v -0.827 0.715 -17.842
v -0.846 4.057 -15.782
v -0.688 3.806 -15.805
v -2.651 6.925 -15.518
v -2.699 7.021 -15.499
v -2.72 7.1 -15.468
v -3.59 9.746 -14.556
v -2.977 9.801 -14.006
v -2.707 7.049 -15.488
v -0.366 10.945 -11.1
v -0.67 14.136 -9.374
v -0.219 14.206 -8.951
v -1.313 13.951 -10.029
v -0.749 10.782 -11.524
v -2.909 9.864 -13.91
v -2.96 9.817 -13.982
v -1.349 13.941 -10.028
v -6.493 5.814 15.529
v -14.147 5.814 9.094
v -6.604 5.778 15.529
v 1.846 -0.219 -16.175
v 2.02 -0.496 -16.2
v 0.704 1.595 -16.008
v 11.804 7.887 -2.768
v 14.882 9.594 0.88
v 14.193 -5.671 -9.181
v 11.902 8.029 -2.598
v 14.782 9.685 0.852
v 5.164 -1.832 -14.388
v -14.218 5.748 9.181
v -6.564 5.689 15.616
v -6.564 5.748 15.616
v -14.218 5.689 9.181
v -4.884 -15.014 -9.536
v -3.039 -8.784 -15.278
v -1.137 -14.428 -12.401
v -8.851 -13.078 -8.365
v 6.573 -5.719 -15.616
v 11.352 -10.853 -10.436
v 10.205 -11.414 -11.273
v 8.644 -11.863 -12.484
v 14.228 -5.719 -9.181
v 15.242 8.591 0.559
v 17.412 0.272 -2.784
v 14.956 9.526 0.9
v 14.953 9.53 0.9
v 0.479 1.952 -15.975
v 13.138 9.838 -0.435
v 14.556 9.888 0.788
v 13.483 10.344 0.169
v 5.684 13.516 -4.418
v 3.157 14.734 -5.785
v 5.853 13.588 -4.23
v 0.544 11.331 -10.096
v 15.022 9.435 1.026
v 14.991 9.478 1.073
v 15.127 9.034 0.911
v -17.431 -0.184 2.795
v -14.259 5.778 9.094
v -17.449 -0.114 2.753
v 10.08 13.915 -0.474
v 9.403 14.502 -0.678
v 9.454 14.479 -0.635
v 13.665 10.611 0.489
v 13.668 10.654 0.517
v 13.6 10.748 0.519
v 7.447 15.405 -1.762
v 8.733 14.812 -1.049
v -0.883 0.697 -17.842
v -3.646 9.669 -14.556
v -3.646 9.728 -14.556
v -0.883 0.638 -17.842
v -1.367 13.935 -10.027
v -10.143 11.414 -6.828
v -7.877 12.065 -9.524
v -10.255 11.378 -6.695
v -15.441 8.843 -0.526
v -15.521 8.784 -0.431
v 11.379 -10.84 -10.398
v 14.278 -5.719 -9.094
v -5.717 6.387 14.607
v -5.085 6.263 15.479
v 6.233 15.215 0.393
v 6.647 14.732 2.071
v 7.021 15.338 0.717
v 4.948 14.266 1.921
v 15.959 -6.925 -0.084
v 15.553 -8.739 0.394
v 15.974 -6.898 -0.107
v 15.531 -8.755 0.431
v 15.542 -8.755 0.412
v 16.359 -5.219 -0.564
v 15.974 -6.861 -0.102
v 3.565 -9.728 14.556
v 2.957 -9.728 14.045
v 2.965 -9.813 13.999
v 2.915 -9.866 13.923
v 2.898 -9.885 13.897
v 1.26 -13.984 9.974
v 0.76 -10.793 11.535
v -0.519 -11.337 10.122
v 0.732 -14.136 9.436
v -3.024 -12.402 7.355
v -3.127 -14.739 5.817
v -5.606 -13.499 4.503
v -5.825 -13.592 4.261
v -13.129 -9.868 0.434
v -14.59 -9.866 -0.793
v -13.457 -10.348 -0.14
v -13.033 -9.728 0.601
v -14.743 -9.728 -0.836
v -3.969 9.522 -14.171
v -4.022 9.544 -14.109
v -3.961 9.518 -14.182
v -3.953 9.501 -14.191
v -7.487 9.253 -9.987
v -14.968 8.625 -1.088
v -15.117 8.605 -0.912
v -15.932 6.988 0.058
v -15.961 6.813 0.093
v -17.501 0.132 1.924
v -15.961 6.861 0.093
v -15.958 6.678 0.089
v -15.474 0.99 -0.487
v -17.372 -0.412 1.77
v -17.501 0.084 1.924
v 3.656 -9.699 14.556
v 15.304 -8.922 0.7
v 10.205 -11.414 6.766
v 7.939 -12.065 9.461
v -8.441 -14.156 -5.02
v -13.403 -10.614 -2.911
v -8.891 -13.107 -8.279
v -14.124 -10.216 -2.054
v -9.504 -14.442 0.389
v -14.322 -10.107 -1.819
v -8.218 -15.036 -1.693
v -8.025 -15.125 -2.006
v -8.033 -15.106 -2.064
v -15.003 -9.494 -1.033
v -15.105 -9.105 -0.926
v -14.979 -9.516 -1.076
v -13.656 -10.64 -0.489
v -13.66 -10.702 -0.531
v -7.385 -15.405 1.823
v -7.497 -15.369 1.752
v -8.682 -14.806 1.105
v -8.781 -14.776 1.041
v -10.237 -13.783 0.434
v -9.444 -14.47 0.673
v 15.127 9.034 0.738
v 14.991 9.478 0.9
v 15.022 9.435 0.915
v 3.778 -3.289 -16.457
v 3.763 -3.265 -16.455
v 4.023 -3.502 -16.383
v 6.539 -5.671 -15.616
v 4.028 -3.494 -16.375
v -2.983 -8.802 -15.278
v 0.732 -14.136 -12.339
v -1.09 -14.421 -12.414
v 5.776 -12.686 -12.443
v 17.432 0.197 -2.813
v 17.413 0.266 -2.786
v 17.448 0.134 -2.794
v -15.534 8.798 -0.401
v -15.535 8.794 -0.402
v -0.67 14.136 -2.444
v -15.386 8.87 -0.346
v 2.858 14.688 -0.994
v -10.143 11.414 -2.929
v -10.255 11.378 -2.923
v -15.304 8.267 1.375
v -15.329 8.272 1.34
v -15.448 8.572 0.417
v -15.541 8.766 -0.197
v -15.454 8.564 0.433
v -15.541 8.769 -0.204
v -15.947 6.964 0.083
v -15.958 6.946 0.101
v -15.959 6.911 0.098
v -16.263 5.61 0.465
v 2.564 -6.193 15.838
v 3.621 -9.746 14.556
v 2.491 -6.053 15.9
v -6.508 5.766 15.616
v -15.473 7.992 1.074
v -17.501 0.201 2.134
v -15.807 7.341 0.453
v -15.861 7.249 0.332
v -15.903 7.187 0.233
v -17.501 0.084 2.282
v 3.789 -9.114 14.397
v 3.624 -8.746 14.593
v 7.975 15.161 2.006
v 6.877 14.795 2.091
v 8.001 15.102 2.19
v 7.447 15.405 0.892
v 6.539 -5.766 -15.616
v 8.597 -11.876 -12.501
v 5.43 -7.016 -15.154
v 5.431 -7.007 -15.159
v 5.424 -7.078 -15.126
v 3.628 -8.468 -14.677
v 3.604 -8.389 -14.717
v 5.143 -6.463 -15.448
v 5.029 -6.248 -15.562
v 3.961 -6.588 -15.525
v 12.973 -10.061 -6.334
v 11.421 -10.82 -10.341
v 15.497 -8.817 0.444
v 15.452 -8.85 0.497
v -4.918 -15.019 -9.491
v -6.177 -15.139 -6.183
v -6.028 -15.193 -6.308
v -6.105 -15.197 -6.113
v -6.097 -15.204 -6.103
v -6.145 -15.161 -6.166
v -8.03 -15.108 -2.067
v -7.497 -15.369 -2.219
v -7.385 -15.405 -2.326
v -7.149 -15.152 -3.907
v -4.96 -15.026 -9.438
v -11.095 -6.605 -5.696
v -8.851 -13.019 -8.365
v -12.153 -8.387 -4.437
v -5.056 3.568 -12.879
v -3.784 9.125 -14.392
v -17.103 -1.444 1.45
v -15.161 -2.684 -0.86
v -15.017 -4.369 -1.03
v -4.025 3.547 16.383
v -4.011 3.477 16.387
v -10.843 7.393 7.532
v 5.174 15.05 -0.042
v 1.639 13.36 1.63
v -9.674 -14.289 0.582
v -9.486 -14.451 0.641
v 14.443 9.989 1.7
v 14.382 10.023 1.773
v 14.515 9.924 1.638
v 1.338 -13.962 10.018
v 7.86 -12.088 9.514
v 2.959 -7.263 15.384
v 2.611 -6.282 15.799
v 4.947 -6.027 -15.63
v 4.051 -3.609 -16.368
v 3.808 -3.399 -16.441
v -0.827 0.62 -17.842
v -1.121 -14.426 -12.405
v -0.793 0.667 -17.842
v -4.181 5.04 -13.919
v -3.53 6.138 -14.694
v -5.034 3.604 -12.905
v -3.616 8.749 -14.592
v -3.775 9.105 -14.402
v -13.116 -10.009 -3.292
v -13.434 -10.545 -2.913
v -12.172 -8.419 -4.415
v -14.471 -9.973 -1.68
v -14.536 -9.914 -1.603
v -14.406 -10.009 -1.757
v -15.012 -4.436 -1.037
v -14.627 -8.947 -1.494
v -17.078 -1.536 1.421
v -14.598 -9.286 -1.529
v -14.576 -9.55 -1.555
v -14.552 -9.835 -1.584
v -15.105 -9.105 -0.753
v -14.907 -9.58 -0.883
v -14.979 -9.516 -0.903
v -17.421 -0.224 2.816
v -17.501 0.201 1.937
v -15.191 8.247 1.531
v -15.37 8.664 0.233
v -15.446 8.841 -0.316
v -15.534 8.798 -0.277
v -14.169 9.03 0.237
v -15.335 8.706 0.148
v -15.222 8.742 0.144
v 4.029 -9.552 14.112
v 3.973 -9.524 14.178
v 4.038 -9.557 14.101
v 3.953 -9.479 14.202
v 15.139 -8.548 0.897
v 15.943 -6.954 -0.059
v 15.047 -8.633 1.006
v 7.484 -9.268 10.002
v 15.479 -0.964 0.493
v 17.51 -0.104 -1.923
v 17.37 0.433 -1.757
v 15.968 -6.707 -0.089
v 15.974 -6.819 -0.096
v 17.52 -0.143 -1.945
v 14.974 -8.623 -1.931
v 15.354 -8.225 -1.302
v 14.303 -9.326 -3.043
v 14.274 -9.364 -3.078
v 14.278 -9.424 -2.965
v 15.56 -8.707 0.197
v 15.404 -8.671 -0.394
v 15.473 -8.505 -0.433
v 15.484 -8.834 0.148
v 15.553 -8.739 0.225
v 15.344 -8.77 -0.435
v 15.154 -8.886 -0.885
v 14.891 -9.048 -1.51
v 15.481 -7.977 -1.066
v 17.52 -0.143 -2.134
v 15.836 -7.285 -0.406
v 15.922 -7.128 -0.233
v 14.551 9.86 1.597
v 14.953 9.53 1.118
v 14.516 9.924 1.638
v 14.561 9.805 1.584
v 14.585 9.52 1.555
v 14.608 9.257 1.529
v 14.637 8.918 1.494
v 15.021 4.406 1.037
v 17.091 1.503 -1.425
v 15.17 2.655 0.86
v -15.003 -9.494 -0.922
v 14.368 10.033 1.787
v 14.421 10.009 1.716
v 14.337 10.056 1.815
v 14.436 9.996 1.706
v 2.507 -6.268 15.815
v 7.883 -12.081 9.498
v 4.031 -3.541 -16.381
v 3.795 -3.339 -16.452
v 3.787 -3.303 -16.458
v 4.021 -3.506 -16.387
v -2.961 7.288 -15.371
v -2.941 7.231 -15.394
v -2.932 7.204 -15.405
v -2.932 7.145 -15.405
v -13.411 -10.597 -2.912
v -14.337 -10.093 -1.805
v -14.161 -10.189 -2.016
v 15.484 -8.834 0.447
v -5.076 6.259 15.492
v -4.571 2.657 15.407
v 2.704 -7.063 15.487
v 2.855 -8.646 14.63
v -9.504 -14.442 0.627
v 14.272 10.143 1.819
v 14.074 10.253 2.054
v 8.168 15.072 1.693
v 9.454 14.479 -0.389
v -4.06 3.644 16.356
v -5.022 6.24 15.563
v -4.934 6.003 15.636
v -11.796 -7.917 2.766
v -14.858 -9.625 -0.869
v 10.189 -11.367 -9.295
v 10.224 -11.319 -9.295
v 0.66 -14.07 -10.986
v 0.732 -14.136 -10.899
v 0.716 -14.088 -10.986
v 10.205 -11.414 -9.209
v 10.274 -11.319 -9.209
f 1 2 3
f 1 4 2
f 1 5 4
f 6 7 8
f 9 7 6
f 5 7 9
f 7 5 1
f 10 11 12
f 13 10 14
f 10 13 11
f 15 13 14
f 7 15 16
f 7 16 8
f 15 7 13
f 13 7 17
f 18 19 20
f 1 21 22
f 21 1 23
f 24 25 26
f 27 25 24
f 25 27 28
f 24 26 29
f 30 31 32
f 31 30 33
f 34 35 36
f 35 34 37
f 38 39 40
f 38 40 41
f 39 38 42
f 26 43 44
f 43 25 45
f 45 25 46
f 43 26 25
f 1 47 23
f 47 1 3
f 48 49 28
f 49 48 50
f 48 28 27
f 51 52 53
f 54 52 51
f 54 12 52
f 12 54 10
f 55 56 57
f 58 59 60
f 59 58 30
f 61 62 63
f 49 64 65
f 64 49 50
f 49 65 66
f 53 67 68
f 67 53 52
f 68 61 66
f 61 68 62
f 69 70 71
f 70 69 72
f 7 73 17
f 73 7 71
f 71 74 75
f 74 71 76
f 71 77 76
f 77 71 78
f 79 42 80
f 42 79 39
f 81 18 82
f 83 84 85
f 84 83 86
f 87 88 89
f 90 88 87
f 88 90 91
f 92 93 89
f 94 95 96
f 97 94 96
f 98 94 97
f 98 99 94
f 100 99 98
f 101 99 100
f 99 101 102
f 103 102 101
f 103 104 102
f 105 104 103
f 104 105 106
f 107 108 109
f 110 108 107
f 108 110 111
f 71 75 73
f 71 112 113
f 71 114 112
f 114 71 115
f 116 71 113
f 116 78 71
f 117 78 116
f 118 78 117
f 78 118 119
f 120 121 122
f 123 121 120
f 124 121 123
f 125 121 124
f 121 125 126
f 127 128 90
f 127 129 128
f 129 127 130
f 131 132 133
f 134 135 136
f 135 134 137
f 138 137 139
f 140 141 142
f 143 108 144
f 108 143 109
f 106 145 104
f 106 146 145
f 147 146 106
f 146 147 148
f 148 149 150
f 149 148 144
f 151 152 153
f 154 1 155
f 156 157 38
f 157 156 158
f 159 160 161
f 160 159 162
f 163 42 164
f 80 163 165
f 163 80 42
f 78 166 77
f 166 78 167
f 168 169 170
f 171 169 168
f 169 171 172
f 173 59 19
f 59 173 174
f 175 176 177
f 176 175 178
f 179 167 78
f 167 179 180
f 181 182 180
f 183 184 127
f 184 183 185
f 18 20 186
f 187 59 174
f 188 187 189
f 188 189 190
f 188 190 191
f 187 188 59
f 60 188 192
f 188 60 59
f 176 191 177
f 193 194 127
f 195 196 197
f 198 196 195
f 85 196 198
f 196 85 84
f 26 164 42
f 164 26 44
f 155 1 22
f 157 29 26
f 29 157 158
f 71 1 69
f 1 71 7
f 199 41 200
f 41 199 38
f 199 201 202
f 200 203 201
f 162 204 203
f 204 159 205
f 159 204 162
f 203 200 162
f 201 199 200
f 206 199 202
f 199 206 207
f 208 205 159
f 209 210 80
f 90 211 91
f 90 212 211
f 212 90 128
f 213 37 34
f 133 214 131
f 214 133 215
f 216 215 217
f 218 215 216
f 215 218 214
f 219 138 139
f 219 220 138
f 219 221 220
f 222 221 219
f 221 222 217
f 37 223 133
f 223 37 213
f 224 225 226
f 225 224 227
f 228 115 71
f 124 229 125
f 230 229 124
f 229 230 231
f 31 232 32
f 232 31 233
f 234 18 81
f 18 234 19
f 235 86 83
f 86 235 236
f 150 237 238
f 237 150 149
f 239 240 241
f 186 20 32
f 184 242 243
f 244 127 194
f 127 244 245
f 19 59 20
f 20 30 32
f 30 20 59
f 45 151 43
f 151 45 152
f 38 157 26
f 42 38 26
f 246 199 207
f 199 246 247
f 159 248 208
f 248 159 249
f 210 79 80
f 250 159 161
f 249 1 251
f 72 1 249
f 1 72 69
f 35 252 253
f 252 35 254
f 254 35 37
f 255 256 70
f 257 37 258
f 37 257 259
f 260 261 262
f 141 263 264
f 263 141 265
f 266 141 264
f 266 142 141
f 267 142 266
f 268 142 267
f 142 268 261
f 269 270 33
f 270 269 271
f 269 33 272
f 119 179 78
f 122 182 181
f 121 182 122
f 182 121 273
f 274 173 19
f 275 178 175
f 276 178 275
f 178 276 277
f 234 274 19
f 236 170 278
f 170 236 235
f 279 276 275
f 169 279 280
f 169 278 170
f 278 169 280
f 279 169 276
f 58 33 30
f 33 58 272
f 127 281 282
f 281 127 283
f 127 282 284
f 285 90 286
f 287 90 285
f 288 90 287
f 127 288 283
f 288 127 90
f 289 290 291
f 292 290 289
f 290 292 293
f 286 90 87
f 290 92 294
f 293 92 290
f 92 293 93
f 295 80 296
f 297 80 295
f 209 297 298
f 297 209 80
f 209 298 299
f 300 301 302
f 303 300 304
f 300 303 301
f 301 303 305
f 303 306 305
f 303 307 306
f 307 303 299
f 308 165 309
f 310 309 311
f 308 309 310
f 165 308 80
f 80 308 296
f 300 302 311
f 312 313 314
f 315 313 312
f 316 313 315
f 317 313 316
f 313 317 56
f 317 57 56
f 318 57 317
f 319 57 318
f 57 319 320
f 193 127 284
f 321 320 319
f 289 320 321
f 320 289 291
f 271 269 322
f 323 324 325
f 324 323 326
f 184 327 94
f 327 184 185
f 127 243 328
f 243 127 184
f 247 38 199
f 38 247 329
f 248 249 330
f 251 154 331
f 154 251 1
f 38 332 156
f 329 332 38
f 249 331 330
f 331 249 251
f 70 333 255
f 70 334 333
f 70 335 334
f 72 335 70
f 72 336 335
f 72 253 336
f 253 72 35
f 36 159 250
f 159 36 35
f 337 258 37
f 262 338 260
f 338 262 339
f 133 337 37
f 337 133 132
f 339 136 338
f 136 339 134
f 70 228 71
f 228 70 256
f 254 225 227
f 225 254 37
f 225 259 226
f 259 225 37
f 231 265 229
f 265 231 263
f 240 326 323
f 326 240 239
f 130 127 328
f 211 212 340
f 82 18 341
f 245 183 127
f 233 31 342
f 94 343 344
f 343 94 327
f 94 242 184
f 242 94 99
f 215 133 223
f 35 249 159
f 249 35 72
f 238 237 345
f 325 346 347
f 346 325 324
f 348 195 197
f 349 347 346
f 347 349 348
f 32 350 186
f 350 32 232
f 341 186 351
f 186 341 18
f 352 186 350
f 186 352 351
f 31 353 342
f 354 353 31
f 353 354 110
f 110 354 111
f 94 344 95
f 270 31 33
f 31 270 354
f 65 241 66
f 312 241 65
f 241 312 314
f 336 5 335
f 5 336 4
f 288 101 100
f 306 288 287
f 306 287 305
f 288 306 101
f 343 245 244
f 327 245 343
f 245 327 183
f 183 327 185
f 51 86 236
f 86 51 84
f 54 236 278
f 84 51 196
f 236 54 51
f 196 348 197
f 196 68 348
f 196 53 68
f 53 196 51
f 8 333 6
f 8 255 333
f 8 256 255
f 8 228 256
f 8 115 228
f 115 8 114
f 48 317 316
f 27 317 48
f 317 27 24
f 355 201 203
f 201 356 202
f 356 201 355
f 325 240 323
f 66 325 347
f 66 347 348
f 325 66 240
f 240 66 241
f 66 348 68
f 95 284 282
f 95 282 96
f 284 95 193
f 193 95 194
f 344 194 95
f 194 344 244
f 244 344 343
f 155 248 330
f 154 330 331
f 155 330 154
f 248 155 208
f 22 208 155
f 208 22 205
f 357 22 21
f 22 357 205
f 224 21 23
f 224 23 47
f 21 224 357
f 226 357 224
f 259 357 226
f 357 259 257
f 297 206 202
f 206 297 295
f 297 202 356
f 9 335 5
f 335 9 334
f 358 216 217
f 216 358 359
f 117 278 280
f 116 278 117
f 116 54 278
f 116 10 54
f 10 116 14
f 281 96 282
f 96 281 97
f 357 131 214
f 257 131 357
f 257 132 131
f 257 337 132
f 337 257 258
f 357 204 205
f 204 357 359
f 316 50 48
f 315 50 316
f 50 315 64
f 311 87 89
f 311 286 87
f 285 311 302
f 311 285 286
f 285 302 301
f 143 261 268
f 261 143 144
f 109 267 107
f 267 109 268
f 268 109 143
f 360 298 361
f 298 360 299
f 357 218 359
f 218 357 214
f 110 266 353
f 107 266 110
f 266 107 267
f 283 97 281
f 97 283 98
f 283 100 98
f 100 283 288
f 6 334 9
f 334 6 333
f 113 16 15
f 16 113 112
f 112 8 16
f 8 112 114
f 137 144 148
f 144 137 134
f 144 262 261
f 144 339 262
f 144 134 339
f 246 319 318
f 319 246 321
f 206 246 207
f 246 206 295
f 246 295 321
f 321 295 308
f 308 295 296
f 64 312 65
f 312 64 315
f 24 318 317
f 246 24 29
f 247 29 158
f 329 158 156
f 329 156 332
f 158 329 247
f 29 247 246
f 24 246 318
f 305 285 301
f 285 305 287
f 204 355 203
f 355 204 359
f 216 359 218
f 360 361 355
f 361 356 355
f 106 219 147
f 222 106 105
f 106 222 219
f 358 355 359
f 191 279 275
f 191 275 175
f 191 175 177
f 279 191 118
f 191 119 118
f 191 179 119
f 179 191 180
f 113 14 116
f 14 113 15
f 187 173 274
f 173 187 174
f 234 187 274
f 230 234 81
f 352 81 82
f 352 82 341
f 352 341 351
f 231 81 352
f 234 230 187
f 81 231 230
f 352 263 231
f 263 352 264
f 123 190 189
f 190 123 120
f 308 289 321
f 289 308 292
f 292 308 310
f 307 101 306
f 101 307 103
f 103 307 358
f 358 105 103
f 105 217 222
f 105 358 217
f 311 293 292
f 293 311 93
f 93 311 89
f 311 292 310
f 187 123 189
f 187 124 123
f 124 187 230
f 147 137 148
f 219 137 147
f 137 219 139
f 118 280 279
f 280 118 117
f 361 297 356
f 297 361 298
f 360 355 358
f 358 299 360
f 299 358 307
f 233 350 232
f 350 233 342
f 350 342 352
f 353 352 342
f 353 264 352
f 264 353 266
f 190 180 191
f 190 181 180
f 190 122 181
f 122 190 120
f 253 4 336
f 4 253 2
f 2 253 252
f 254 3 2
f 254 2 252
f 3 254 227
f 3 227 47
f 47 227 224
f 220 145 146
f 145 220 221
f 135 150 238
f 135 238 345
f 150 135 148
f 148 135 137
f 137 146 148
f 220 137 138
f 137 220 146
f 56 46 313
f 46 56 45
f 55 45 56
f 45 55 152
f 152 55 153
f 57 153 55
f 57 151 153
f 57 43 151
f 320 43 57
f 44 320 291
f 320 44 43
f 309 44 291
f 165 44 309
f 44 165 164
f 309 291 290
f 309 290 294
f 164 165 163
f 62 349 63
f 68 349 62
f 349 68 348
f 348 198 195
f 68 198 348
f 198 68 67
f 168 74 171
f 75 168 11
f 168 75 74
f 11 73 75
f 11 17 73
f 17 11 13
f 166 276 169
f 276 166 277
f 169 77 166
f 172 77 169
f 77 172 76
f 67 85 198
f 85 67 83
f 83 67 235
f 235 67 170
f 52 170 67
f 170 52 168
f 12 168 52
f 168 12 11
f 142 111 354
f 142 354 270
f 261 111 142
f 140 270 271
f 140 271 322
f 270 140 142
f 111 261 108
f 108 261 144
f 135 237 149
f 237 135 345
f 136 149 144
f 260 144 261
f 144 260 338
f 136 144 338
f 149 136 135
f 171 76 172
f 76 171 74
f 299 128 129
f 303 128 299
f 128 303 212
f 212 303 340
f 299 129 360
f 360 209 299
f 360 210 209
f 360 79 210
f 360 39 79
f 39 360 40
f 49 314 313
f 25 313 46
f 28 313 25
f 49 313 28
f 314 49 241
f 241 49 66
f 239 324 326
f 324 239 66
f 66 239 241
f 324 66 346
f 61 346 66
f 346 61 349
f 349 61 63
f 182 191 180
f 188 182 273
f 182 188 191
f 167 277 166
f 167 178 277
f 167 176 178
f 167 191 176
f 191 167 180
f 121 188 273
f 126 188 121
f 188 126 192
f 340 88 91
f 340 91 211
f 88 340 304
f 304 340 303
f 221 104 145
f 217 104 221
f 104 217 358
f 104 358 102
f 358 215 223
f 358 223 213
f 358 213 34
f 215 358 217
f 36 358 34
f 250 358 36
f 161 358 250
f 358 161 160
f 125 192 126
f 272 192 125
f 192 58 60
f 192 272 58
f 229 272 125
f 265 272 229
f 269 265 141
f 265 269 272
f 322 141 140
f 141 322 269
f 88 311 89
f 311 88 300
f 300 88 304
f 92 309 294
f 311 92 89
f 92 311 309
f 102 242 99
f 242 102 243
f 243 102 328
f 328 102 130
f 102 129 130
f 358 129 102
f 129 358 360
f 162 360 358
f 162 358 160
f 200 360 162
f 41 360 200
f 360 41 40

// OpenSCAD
// Auto-generated OpenSCAD file

    inner_points = 10*[[-0.21767207125666155, -0.32071847091711014, 1.7360795183920927], [-1.4922229350476093, -0.9435162185789954, -0.21739691757103918], [-0.46744991045730744, 0.6370588317477957, 1.5936938816719737], [-1.7420007742482555, 0.014261084085910432, -0.35978255429115813], [1.7420007742482542, -0.014261084085911972, 0.35978255429115813], [0.4674499104573061, -0.6370588317477972, -1.5936938816719737], [1.492222935047608, 0.9435162185789938, 0.21739691757103918], [0.21767207125666022, 0.3207184709171086, -1.7360795183920927], [-0.4143597724049588, -1.1803825334804832, 1.2646013664549804], [-0.942296026121513, -1.4383538071774526, 0.4554449329027941], [-1.017376819383404, 1.131896420346253, 0.9208520311981405], [-1.545313073099958, 0.8739251466492834, 0.11169559764595427], [1.5453130730999567, -0.873925146649285, -0.11169559764595427], [1.0173768193834027, -1.1318964203462543, -0.9208520311981405], [0.9422960261215116, 1.4383538071774513, -0.4554449329027941], [0.41435977240495747, 1.1803825334804818, -1.2646013664549804], [0.5329224201734905, -0.9082100060398764, 1.4336533198017478], [-0.7416284436174575, -1.5310077537017615, -0.5198231161613842], [-0.07009462680495482, 1.4040689477868598, 1.089903984544908], [-1.3446454905959027, 0.7812712001249748, -0.8635724514182238], [1.3446454905959013, -0.7812712001249763, 0.8635724514182238], [0.07009462680495349, -1.404068947786861, -1.089903984544908], [0.7416284436174562, 1.5310077537017601, 0.5198231161613842], [-0.5329224201734918, 0.9082100060398749, -1.4336533198017478], [0.43660784939141806, 0.40405282035525075, 1.9520062670457445], [1.584557624473923, 0.5835714012715488, 1.1457901713283336], [1.1872023408215704, -0.18343871476751553, 1.6495800684553996], [0.8339631330437706, 1.1710629363943152, 1.4482163699186787]];

    outer_points = 10*[[-0.2998492432811004, -0.8754891635864159, -1.5191519733455254], [-0.9669049177063294, 1.3048578449672972, -0.7257096161108192], [-0.8810229625548427, -1.3048578449672972, -0.8278635794933151], [-1.5480786369800716, 0.8754891635864159, -0.034421222258608775], [1.5480786369800716, -0.8754891635864159, 0.034421222258608775], [0.8810229625548427, 1.3048578449672972, 0.8278635794933151], [0.9669049177063294, -1.3048578449672972, 0.7257096161108192], [0.2998492432811004, 0.8754891635864159, 1.5191519733455254], [-0.084273448945414, 0.0667291961127105, -1.775572798440574], [-0.36057695615027563, 0.9698584977352651, -1.4469182131126805], [-1.4873509241108964, -0.9698584977352651, -0.10665498249145389], [-1.763654431315758, -0.0667291961127105, 0.2219996028364397], [1.763654431315758, 0.0667291961127105, -0.2219996028364397], [1.4873509241108964, 0.9698584977352651, 0.10665498249145389], [0.36057695615027563, -0.9698584977352651, 1.4469182131126805], [0.084273448945414, -0.0667291961127105, 1.775572798440574], [0.6523481796495847, -0.5718796573528687, -1.5529356304711843], [-0.01470749477564448, 1.6084673512008445, -0.7594932732364776], [-0.7507292955158978, -1.6084673512008445, 0.11598218547793598], [-1.417784969941127, 0.5718796573528687, 0.9094245427126425], [1.417784969941127, -0.5718796573528687, -0.9094245427126425], [0.7507292955158978, 1.6084673512008445, -0.11598218547793598], [0.01470749477564448, -1.6084673512008445, 0.7594932732364776], [-0.6523481796495847, 0.5718796573528687, 1.5529356304711843], [-0.012341624162016562, -1.728782357742436, -1.0841461184935561], [1.0701494658076132, -1.728782357742436, -0.17408401064796336], [0.9398557987686684, -1.4251728515088886, -1.1179297756192146], [0.11795204287692822, -2.0323918639759833, -0.1403003535223048]];

    // Convex hull for inner set (I)
    module inner_hull() {
        hull() {
            for (p = inner_points) {
                translate(p) sphere(r=0.1);
            }
        }
    }

    // Convex hull for outer set (O) minus inner hull (O \ I)
    module outer_minus_inner() {
        difference() {
            hull() {
                for (p = outer_points) {
                    translate(p) sphere(r=0.1);
                }
            }
            inner_hull(); // Subtract inner hull
        }
    }

    // Convex hull for outer set (O) minus all translated inner hulls
    module outer_minus_AllTranslationInner() {
        difference() {
            hull() {
                for (p = outer_points) {
                    translate(p) sphere(r=0.1);
                }
            }
            hull() {
                translate([0,0,50]) inner_hull();
                translate([0,0,-50]) inner_hull();
            }; // Subtract translated inner hulls
        }
    }

    // Difference between outer_minus_inner and outer_minus_AllTranslationInner
    module outer_minus_inner_diff() {
        difference() {
            // Outer minus inner
            difference() {
                hull() {
                    for (p = outer_points) {
                        translate(p) sphere(r=0.1);
                    }
                }
                inner_hull();
            }

            // Subtract Outer minus AllTranslationInner
            difference() {
                hull() {
                    for (p = outer_points) {
                        translate(p) sphere(r=0.1);
                    }
                }
                hull() {
                    translate([0,0,50]) inner_hull();
                    translate([0,0,-50]) inner_hull();
                };
            }
        }
    }

    // Rendering all with colors applied
    color([1, 1, 0, 1]) outer_minus_inner_diff(); // Opaque yellow
    
